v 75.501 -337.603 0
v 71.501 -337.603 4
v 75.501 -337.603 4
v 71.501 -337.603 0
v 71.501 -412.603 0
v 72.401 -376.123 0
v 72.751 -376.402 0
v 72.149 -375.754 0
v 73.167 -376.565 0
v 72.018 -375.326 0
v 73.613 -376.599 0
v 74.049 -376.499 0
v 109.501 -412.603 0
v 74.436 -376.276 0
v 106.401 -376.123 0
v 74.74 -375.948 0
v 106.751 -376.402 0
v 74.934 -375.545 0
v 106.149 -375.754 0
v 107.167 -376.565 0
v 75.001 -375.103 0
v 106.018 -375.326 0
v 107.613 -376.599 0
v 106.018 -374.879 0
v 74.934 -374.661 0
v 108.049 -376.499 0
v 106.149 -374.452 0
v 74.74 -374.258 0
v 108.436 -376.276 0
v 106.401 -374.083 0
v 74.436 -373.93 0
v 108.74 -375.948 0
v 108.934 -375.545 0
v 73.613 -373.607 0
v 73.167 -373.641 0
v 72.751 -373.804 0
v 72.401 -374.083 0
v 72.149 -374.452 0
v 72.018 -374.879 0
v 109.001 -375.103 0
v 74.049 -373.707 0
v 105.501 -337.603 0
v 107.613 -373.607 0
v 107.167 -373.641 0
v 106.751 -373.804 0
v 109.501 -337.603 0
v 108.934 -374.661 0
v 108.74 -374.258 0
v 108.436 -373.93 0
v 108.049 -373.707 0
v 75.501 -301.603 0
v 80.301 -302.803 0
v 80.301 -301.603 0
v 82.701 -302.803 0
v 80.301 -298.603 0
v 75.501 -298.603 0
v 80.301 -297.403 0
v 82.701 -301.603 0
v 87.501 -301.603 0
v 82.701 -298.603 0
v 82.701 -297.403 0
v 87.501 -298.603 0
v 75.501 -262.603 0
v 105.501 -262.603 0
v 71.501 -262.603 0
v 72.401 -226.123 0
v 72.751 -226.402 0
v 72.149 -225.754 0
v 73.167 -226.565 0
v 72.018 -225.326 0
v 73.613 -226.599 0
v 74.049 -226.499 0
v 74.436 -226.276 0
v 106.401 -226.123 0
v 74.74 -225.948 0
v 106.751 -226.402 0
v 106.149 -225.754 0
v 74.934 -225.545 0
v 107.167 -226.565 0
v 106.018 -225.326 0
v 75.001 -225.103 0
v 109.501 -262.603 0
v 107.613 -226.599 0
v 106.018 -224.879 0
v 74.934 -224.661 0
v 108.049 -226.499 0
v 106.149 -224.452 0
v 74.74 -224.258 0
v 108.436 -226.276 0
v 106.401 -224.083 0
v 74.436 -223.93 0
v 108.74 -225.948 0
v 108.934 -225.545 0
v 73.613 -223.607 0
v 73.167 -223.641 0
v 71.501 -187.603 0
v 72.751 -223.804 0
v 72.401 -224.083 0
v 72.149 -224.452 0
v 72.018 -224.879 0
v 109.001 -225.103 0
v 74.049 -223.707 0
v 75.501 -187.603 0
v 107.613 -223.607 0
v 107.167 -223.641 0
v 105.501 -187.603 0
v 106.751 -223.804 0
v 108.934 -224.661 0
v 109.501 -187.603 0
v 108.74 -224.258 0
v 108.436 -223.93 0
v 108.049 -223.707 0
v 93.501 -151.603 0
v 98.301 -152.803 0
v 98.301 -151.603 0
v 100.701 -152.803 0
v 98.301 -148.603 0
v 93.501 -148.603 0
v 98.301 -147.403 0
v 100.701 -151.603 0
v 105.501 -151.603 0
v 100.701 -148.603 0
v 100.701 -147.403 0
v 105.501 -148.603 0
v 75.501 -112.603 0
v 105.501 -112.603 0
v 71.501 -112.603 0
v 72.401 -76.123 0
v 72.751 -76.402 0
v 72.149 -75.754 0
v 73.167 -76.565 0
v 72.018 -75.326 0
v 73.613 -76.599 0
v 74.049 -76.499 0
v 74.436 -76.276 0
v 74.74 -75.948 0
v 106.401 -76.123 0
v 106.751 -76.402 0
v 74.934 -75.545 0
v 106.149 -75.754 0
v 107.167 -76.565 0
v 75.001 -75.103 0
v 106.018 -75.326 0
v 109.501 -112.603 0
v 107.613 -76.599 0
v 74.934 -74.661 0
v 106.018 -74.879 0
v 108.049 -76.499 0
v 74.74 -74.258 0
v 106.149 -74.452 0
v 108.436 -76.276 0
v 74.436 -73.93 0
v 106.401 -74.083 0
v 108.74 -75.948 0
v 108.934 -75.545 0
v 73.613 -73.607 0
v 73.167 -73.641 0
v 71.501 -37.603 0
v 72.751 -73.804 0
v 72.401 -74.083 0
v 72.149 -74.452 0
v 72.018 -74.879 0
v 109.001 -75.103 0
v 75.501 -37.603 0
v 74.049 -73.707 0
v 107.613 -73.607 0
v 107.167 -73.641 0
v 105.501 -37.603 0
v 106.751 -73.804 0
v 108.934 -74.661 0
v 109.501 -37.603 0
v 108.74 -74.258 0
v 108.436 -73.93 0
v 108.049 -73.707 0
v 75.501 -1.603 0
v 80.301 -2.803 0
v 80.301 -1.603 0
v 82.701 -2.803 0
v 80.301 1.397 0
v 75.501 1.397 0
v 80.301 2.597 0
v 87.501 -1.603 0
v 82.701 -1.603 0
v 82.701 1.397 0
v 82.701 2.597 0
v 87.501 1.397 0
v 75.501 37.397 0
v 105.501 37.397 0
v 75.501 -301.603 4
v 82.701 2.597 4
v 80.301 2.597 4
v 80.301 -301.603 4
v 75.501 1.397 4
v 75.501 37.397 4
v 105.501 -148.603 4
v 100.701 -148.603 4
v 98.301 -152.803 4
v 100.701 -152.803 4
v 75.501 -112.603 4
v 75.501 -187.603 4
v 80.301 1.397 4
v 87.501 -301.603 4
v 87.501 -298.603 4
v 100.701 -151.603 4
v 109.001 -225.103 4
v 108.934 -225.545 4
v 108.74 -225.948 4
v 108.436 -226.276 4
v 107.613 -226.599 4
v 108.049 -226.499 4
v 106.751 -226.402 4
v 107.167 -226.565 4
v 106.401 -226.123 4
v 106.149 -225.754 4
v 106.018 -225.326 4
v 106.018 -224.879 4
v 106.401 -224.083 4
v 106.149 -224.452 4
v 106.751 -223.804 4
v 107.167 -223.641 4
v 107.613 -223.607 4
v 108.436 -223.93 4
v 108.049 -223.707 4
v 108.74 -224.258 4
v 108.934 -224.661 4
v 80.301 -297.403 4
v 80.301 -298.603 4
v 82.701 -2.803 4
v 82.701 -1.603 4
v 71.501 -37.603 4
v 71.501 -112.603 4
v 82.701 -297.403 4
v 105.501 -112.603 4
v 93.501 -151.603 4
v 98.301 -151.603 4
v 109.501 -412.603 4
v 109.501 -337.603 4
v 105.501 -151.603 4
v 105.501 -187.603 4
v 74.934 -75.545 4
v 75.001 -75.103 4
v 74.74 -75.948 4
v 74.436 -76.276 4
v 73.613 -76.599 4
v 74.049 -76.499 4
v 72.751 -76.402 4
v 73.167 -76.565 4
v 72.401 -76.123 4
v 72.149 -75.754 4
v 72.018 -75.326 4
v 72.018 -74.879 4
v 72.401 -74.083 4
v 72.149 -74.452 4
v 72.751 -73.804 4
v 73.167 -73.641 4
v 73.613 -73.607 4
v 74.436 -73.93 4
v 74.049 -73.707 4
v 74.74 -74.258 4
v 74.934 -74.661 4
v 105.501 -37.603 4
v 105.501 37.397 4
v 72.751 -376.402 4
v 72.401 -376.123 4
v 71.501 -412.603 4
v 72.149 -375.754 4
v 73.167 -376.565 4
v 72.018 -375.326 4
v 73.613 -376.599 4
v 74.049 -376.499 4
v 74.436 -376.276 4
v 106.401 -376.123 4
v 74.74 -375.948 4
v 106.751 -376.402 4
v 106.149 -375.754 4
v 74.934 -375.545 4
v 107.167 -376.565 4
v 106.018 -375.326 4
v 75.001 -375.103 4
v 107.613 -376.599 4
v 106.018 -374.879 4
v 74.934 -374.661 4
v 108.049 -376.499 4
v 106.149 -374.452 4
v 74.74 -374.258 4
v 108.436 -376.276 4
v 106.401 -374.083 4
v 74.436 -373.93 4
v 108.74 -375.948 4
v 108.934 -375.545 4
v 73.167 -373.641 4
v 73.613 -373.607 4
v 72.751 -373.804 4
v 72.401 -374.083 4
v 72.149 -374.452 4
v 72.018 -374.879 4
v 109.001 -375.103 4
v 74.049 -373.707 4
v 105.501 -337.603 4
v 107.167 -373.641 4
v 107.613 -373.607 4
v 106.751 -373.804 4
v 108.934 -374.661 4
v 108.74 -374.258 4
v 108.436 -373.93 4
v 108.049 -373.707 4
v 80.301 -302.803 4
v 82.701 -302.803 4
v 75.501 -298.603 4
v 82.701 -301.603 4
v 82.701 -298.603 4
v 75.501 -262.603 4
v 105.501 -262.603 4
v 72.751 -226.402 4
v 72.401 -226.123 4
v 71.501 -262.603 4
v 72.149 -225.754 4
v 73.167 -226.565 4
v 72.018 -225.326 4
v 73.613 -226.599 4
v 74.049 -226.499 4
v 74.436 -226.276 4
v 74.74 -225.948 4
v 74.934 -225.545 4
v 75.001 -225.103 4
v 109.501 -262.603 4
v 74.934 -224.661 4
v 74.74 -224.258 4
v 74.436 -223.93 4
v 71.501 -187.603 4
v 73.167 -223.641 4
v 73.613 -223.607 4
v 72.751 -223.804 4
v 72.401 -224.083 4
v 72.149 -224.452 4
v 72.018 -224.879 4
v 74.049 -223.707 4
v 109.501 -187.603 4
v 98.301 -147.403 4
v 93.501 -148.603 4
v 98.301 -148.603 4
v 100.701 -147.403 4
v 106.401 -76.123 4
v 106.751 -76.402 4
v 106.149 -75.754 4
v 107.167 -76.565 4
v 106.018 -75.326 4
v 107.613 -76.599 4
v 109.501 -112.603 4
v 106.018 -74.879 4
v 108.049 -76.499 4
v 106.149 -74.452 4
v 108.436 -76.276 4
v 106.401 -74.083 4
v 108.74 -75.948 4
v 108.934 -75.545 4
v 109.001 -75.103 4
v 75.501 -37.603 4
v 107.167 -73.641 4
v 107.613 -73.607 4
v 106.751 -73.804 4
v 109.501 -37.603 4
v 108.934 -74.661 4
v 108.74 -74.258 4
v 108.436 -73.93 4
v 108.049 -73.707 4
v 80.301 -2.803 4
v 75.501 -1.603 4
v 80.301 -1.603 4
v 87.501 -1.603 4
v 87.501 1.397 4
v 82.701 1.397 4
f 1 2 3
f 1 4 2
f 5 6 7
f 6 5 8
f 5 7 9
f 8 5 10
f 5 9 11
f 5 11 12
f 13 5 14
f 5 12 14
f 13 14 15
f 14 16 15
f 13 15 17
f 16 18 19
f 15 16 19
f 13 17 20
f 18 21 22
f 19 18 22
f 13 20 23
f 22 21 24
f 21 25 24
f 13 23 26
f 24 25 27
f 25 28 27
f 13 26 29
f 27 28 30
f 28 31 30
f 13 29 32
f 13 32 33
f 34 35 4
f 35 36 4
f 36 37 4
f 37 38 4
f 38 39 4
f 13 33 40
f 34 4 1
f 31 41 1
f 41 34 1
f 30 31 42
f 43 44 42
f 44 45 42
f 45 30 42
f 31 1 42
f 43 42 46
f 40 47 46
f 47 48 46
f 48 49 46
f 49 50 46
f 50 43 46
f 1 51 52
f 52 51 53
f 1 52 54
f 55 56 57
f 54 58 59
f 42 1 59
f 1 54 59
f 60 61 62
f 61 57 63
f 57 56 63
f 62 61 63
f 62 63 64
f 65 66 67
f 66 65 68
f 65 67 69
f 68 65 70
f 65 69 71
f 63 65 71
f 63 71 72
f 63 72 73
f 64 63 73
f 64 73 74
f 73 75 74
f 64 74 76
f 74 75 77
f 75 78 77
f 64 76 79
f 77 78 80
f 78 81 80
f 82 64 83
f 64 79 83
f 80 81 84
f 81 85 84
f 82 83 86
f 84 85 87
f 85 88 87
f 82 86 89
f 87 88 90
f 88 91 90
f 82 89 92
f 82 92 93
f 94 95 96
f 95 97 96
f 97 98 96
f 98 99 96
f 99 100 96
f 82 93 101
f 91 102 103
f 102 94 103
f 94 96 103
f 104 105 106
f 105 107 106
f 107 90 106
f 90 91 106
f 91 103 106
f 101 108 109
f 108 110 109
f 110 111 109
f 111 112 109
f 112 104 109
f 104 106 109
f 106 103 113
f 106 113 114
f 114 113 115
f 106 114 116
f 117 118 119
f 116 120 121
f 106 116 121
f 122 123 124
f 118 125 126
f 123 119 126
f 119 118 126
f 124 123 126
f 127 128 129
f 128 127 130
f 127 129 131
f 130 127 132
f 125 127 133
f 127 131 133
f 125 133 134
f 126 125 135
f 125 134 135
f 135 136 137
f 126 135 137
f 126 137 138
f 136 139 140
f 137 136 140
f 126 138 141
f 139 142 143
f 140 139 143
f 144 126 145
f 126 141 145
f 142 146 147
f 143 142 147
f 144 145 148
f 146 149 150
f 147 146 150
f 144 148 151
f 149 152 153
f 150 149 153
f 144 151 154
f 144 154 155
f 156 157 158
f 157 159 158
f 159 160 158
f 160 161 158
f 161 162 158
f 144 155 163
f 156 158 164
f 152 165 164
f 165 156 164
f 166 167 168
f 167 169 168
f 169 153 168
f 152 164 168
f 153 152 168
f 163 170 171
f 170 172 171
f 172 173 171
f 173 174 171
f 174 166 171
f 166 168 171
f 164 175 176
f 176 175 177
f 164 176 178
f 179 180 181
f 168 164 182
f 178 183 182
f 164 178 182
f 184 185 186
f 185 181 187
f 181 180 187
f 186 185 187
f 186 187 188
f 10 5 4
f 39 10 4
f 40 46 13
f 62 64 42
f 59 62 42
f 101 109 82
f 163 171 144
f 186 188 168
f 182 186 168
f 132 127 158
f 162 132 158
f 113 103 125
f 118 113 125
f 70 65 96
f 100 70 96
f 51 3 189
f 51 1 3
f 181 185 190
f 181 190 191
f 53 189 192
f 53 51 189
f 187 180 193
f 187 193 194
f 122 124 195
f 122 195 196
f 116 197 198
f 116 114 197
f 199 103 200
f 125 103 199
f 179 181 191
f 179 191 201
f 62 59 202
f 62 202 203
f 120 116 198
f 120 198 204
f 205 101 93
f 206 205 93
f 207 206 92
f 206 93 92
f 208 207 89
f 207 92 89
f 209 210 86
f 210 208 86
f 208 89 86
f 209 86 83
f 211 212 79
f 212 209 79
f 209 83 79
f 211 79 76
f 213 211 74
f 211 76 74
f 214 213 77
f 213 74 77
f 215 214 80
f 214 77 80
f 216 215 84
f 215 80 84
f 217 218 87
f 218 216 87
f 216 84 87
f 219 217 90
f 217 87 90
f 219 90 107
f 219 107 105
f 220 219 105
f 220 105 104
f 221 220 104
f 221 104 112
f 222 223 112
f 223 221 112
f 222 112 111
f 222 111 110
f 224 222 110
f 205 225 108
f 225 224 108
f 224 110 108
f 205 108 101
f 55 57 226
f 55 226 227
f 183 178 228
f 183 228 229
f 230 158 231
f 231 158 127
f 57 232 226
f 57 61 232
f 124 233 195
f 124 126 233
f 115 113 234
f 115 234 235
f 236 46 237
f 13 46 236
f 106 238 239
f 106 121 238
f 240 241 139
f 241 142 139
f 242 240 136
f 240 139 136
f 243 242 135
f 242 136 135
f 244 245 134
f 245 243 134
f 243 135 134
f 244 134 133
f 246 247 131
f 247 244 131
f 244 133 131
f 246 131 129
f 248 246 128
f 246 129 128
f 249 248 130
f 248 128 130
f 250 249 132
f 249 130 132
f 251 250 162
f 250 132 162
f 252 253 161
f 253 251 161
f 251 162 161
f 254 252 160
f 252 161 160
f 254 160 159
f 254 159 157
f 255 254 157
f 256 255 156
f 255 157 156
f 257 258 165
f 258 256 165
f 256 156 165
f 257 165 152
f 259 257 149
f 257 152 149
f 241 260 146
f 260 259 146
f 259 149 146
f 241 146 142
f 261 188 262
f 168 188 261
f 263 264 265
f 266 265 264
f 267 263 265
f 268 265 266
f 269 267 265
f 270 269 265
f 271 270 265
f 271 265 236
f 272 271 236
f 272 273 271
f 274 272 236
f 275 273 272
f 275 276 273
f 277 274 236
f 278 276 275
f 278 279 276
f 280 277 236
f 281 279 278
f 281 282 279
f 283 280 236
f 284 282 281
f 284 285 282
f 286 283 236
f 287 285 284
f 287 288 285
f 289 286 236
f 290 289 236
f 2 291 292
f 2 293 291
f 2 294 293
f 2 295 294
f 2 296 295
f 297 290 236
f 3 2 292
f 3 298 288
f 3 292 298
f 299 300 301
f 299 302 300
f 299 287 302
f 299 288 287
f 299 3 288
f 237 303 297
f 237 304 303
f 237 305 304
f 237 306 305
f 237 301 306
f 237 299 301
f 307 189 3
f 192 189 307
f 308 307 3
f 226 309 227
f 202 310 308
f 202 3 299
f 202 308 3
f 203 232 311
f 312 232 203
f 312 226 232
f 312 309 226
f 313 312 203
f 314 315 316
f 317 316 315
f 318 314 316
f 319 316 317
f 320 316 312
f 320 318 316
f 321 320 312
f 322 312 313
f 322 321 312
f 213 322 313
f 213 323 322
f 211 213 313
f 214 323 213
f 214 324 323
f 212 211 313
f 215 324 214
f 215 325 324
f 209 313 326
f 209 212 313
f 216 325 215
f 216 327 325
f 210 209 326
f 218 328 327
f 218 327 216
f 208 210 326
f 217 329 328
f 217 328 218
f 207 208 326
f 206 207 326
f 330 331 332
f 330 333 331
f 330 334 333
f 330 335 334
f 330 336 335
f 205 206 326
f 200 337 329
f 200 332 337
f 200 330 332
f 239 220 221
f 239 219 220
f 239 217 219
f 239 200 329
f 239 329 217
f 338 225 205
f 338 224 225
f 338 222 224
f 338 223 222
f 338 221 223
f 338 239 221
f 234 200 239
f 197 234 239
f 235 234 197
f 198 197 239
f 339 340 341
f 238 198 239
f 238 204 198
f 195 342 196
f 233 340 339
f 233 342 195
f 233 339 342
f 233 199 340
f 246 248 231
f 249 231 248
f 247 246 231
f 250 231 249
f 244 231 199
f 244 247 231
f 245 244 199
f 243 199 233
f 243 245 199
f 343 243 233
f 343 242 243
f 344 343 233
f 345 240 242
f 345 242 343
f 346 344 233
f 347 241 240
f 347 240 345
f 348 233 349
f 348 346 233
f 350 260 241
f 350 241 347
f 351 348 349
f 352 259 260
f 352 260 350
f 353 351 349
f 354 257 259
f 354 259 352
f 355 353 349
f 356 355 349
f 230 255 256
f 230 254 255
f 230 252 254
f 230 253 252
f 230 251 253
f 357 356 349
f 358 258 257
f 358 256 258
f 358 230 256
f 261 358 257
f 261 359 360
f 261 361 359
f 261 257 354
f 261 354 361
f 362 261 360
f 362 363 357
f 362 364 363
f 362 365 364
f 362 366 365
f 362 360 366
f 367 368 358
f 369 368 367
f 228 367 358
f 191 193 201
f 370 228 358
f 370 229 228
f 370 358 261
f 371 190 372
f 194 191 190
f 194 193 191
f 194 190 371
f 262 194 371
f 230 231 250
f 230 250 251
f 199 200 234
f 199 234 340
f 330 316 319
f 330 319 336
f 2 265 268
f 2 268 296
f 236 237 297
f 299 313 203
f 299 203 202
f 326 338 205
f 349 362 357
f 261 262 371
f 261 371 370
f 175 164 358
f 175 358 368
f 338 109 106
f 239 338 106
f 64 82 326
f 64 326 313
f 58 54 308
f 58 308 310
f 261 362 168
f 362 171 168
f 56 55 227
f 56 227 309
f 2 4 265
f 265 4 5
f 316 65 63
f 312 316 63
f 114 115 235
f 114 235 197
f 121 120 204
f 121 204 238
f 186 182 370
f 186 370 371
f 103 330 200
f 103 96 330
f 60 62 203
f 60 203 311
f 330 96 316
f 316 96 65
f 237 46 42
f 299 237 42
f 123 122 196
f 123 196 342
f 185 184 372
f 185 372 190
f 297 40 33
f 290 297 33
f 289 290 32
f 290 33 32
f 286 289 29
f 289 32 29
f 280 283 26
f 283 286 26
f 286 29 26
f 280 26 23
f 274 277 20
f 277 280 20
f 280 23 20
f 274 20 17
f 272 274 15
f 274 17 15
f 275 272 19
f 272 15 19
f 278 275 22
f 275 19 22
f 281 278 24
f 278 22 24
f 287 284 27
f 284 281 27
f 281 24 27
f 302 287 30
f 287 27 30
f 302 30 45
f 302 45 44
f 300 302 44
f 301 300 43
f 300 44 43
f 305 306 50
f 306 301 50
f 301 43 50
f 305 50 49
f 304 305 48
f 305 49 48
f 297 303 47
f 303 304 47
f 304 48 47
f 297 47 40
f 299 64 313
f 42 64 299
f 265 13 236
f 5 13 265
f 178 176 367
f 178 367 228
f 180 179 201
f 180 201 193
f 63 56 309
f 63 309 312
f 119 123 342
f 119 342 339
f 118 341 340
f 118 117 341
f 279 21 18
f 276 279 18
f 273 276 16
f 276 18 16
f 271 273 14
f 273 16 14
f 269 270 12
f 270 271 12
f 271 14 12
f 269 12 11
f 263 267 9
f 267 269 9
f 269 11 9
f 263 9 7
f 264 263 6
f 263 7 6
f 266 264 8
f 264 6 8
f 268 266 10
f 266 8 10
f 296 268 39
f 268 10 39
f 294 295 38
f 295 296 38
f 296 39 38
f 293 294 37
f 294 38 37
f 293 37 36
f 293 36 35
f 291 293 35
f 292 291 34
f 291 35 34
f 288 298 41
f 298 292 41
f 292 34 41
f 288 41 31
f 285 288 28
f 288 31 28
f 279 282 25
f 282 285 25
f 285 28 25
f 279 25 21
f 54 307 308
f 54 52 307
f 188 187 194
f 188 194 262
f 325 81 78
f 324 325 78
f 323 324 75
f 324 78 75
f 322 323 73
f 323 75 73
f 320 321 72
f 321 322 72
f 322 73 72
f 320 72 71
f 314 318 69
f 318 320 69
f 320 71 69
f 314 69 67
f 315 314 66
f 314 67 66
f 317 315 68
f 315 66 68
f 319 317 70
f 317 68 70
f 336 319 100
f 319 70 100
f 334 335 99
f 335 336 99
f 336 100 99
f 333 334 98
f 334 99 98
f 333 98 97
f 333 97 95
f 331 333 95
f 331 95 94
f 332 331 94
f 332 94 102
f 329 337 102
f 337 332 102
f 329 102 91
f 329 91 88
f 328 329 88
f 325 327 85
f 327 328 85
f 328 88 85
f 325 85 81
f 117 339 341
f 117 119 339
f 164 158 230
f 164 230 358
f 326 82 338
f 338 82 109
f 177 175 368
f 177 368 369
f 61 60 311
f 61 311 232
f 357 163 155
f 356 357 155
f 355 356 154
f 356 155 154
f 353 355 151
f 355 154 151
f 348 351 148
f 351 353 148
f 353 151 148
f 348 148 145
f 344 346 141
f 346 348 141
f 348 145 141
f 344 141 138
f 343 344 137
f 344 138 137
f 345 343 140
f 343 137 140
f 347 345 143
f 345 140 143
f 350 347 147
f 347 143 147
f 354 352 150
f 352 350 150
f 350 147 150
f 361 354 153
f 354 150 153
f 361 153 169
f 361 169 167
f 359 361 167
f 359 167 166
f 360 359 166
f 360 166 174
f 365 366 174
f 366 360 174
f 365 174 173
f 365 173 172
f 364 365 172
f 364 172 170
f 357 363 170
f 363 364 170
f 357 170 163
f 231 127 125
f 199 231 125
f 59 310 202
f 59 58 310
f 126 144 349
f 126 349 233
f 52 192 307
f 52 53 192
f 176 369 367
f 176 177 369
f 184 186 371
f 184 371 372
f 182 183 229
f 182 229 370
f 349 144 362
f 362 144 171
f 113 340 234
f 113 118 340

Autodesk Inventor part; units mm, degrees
ref_plane "YZ Plane" through (0, 0, 0) normal (1, 0, 0) x (0, 1, 0)
ref_plane "XZ Plane" through (0, 0, 0) normal (0, 1, 0) x (-1, 0, 0)
ref_plane "XY Plane" through (0, 0, 0) normal (0, 0, 1) x (1, 0, 0)
sketch "Sketch1" plane through (0, 0, 0) normal (0, 0, 1) x (1, 0, 0)
  line L0 (75.5009, -337.6029) -> (75.5009, -262.6029) projected
  line L1 (71.5009, -262.6029) -> (75.5009, -262.6029) projected
  line L2 (71.5009, -337.6029) -> (71.5009, -262.6029) projected
  line L3 (71.5009, -337.6029) -> (75.5009, -337.6029) projected
  line L4 (75.5009, -187.6029) -> (75.5009, -112.6029) projected
  line L5 (71.5009, -112.6029) -> (75.5009, -112.6029) projected
  line L6 (71.5009, -187.6029) -> (71.5009, -112.6029) projected
  line L7 (71.5009, -187.6029) -> (75.5009, -187.6029) projected
  line L8 (75.5009, -37.6029) -> (75.5009, 37.3971) projected
  line L9 (71.5009, 37.3971) -> (75.5009, 37.3971) projected
  line L10 (71.5009, -37.6029) -> (71.5009, 37.3971) projected
  line L11 (71.5009, -37.6029) -> (75.5009, -37.6029) projected
  line L12 (75.5009, 37.3971) -> (105.5009, 37.3971)
  line L13 (105.5009, 37.3971) -> (105.5009, -412.6029)
  line L14 (105.5009, -412.6029) -> (75.5009, -412.6029)
  line L15 (75.5009, -412.6029) -> (75.5009, 37.3971)
  line L16 (71.5009, -412.6029) -> (279.5009, -412.6029) construction
  line L17 (90.5009, -412.6029) -> (90.5009, 37.3971) construction
  line L18 (105.5009, -337.6029) -> (105.5009, -262.6029)
  line L19 (109.5009, -262.6029) -> (105.5009, -262.6029)
  line L20 (109.5009, -337.6029) -> (109.5009, -262.6029)
  line L21 (109.5009, -337.6029) -> (105.5009, -337.6029)
  line L22 (105.5009, -187.6029) -> (105.5009, -112.6029)
  line L23 (109.5009, -112.6029) -> (105.5009, -112.6029)
  line L24 (109.5009, -187.6029) -> (109.5009, -112.6029)
  line L25 (109.5009, -187.6029) -> (105.5009, -187.6029)
  line L26 (105.5009, -37.6029) -> (105.5009, 37.3971)
  line L27 (109.5009, 37.3971) -> (105.5009, 37.3971)
  line L28 (109.5009, -37.6029) -> (109.5009, 37.3971)
  line L29 (109.5009, -37.6029) -> (105.5009, -37.6029)
  line L30 (71.5009, -37.6029) -> (71.5009, -112.6029)
  line L31 (71.5009, -187.6029) -> (71.5009, -262.6029)
  line L32 (71.5009, -337.6029) -> (71.5009, -412.6029)
  line L33 (75.5009, -412.6029) -> (71.5009, -412.6029)
  line L34 (109.5009, -337.6029) -> (109.5009, -412.6029)
  line L35 (109.5009, -412.6029) -> (105.5009, -412.6029)
  line L36 (109.5009, -262.6029) -> (109.5009, -187.6029)
  line L37 (109.5009, -112.6029) -> (109.5009, -37.6029)
  line L38 (71.5009, -37.6029) -> (75.5009, -112.6029) construction
  circle A0 centre (73.5009, -75.1029) radius 1.5
  circle A1 centre (73.5009, -225.1029) radius 1.5
  circle A2 centre (73.5009, -375.1029) radius 1.5
  circle A3 centre (107.5009, -75.1029) radius 1.5
  circle A4 centre (107.5009, -225.1029) radius 1.5
  circle A5 centre (107.5009, -375.1029) radius 1.5
  line L39 (75.5009, -1.6029) -> (87.5009, -1.6029)
  line L40 (87.5009, -1.6029) -> (87.5009, 1.3971)
  line L41 (87.5009, 1.3971) -> (75.5009, 1.3971)
  line L42 (75.5009, 1.3971) -> (75.5009, -1.6029)
  line L43 (82.7009, 2.5971) -> (80.3009, 2.5971)
  line L44 (80.3009, 2.5971) -> (80.3009, -2.8029)
  line L45 (80.3009, -2.8029) -> (82.7009, -2.8029)
  line L46 (82.7009, -2.8029) -> (82.7009, 2.5971)
  line L47 (93.5009, -151.6029) -> (105.5009, -151.6029)
  line L48 (105.5009, -151.6029) -> (105.5009, -148.6029)
  line L49 (105.5009, -148.6029) -> (93.5009, -148.6029)
  line L50 (93.5009, -148.6029) -> (93.5009, -151.6029)
  line L51 (100.7009, -147.4029) -> (98.3009, -147.4029)
  line L52 (98.3009, -147.4029) -> (98.3009, -152.8029)
  line L53 (98.3009, -152.8029) -> (100.7009, -152.8029)
  line L54 (100.7009, -152.8029) -> (100.7009, -147.4029)
  line L55 (75.5009, -301.6029) -> (87.5009, -301.6029)
  line L56 (87.5009, -301.6029) -> (87.5009, -298.6029)
  line L57 (87.5009, -298.6029) -> (75.5009, -298.6029)
  line L58 (75.5009, -298.6029) -> (75.5009, -301.6029)
  line L59 (82.7009, -297.4029) -> (80.3009, -297.4029)
  line L60 (80.3009, -297.4029) -> (80.3009, -302.8029)
  line L61 (80.3009, -302.8029) -> (82.7009, -302.8029)
  line L62 (82.7009, -302.8029) -> (82.7009, -297.4029)
  point P0 (87.5009, -0.1029)
  point P1 (71.5009, -0.1029)
  point P2 (82.7009, -0.1029)
  point P3 (81.5009, 2.5971)
  point P4 (81.5009, -1.6029)
  point P5 (105.5009, -150.1029)
  point P6 (100.7009, -150.1029)
  point P7 (99.5009, -147.4029)
  point P8 (99.5009, -151.6029)
  point P9 (87.5009, -300.1029)
  point P10 (82.7009, -300.1029)
  point P11 (81.5009, -297.4029)
  point P12 (81.5009, -301.6029)
  point P13 (109.5009, -150.1029)
  point P14 (71.5009, -300.1029)
  point P15 (80.3009, 1.3971)
  point P16 (82.7009, 1.3971)
  point P17 (82.7009, -1.6029)
  point P18 (80.3009, -1.6029)
  point P19 (80.3009, -298.6029)
  point P20 (82.7009, -298.6029)
  point P21 (82.7009, -301.6029)
  point P22 (80.3009, -301.6029)
  point P23 (100.7009, -151.6029)
  point P24 (98.3009, -151.6029)
  point P25 (98.3009, -148.6029)
  point P26 (100.7009, -148.6029)
  dimension "d3" = 30
  dimension "d4" = 3
  dimension "d7" = 150
  dimension "d10" = 34
  dimension "d13" = 3
  dimension "d14" = 12
  dimension "d15" = 5.4
  dimension "d16" = 2.4
  dimension "d17" = 3
  dimension "d18" = 12
  dimension "d19" = 5.4
  dimension "d20" = 2.4
  dimension "d21" = 3
  dimension "d22" = 12
  dimension "d23" = 5.4
  dimension "d24" = 2.4
extrude "Extrusion1" add sketch "Sketch1" along normal blind 4 contours L15 L33 L32 L3 | L0 L55 L60 L61 L62 L56 L57 L59 L15 L4 L8 L39 L44 L45 L46 L40 L41 L43 L12 L13 L49 L54 L51 L52 L50 L47 L53 L14 | L31 L7 L15 L1 | L13 L21 L34 L35 | L30 L11 L15 L5 | L13 L25 L36 L19 | L23 L13 L29 L37
properties part number "Cableduct_Cover" material "MDF Medium Density Fiberboard"
